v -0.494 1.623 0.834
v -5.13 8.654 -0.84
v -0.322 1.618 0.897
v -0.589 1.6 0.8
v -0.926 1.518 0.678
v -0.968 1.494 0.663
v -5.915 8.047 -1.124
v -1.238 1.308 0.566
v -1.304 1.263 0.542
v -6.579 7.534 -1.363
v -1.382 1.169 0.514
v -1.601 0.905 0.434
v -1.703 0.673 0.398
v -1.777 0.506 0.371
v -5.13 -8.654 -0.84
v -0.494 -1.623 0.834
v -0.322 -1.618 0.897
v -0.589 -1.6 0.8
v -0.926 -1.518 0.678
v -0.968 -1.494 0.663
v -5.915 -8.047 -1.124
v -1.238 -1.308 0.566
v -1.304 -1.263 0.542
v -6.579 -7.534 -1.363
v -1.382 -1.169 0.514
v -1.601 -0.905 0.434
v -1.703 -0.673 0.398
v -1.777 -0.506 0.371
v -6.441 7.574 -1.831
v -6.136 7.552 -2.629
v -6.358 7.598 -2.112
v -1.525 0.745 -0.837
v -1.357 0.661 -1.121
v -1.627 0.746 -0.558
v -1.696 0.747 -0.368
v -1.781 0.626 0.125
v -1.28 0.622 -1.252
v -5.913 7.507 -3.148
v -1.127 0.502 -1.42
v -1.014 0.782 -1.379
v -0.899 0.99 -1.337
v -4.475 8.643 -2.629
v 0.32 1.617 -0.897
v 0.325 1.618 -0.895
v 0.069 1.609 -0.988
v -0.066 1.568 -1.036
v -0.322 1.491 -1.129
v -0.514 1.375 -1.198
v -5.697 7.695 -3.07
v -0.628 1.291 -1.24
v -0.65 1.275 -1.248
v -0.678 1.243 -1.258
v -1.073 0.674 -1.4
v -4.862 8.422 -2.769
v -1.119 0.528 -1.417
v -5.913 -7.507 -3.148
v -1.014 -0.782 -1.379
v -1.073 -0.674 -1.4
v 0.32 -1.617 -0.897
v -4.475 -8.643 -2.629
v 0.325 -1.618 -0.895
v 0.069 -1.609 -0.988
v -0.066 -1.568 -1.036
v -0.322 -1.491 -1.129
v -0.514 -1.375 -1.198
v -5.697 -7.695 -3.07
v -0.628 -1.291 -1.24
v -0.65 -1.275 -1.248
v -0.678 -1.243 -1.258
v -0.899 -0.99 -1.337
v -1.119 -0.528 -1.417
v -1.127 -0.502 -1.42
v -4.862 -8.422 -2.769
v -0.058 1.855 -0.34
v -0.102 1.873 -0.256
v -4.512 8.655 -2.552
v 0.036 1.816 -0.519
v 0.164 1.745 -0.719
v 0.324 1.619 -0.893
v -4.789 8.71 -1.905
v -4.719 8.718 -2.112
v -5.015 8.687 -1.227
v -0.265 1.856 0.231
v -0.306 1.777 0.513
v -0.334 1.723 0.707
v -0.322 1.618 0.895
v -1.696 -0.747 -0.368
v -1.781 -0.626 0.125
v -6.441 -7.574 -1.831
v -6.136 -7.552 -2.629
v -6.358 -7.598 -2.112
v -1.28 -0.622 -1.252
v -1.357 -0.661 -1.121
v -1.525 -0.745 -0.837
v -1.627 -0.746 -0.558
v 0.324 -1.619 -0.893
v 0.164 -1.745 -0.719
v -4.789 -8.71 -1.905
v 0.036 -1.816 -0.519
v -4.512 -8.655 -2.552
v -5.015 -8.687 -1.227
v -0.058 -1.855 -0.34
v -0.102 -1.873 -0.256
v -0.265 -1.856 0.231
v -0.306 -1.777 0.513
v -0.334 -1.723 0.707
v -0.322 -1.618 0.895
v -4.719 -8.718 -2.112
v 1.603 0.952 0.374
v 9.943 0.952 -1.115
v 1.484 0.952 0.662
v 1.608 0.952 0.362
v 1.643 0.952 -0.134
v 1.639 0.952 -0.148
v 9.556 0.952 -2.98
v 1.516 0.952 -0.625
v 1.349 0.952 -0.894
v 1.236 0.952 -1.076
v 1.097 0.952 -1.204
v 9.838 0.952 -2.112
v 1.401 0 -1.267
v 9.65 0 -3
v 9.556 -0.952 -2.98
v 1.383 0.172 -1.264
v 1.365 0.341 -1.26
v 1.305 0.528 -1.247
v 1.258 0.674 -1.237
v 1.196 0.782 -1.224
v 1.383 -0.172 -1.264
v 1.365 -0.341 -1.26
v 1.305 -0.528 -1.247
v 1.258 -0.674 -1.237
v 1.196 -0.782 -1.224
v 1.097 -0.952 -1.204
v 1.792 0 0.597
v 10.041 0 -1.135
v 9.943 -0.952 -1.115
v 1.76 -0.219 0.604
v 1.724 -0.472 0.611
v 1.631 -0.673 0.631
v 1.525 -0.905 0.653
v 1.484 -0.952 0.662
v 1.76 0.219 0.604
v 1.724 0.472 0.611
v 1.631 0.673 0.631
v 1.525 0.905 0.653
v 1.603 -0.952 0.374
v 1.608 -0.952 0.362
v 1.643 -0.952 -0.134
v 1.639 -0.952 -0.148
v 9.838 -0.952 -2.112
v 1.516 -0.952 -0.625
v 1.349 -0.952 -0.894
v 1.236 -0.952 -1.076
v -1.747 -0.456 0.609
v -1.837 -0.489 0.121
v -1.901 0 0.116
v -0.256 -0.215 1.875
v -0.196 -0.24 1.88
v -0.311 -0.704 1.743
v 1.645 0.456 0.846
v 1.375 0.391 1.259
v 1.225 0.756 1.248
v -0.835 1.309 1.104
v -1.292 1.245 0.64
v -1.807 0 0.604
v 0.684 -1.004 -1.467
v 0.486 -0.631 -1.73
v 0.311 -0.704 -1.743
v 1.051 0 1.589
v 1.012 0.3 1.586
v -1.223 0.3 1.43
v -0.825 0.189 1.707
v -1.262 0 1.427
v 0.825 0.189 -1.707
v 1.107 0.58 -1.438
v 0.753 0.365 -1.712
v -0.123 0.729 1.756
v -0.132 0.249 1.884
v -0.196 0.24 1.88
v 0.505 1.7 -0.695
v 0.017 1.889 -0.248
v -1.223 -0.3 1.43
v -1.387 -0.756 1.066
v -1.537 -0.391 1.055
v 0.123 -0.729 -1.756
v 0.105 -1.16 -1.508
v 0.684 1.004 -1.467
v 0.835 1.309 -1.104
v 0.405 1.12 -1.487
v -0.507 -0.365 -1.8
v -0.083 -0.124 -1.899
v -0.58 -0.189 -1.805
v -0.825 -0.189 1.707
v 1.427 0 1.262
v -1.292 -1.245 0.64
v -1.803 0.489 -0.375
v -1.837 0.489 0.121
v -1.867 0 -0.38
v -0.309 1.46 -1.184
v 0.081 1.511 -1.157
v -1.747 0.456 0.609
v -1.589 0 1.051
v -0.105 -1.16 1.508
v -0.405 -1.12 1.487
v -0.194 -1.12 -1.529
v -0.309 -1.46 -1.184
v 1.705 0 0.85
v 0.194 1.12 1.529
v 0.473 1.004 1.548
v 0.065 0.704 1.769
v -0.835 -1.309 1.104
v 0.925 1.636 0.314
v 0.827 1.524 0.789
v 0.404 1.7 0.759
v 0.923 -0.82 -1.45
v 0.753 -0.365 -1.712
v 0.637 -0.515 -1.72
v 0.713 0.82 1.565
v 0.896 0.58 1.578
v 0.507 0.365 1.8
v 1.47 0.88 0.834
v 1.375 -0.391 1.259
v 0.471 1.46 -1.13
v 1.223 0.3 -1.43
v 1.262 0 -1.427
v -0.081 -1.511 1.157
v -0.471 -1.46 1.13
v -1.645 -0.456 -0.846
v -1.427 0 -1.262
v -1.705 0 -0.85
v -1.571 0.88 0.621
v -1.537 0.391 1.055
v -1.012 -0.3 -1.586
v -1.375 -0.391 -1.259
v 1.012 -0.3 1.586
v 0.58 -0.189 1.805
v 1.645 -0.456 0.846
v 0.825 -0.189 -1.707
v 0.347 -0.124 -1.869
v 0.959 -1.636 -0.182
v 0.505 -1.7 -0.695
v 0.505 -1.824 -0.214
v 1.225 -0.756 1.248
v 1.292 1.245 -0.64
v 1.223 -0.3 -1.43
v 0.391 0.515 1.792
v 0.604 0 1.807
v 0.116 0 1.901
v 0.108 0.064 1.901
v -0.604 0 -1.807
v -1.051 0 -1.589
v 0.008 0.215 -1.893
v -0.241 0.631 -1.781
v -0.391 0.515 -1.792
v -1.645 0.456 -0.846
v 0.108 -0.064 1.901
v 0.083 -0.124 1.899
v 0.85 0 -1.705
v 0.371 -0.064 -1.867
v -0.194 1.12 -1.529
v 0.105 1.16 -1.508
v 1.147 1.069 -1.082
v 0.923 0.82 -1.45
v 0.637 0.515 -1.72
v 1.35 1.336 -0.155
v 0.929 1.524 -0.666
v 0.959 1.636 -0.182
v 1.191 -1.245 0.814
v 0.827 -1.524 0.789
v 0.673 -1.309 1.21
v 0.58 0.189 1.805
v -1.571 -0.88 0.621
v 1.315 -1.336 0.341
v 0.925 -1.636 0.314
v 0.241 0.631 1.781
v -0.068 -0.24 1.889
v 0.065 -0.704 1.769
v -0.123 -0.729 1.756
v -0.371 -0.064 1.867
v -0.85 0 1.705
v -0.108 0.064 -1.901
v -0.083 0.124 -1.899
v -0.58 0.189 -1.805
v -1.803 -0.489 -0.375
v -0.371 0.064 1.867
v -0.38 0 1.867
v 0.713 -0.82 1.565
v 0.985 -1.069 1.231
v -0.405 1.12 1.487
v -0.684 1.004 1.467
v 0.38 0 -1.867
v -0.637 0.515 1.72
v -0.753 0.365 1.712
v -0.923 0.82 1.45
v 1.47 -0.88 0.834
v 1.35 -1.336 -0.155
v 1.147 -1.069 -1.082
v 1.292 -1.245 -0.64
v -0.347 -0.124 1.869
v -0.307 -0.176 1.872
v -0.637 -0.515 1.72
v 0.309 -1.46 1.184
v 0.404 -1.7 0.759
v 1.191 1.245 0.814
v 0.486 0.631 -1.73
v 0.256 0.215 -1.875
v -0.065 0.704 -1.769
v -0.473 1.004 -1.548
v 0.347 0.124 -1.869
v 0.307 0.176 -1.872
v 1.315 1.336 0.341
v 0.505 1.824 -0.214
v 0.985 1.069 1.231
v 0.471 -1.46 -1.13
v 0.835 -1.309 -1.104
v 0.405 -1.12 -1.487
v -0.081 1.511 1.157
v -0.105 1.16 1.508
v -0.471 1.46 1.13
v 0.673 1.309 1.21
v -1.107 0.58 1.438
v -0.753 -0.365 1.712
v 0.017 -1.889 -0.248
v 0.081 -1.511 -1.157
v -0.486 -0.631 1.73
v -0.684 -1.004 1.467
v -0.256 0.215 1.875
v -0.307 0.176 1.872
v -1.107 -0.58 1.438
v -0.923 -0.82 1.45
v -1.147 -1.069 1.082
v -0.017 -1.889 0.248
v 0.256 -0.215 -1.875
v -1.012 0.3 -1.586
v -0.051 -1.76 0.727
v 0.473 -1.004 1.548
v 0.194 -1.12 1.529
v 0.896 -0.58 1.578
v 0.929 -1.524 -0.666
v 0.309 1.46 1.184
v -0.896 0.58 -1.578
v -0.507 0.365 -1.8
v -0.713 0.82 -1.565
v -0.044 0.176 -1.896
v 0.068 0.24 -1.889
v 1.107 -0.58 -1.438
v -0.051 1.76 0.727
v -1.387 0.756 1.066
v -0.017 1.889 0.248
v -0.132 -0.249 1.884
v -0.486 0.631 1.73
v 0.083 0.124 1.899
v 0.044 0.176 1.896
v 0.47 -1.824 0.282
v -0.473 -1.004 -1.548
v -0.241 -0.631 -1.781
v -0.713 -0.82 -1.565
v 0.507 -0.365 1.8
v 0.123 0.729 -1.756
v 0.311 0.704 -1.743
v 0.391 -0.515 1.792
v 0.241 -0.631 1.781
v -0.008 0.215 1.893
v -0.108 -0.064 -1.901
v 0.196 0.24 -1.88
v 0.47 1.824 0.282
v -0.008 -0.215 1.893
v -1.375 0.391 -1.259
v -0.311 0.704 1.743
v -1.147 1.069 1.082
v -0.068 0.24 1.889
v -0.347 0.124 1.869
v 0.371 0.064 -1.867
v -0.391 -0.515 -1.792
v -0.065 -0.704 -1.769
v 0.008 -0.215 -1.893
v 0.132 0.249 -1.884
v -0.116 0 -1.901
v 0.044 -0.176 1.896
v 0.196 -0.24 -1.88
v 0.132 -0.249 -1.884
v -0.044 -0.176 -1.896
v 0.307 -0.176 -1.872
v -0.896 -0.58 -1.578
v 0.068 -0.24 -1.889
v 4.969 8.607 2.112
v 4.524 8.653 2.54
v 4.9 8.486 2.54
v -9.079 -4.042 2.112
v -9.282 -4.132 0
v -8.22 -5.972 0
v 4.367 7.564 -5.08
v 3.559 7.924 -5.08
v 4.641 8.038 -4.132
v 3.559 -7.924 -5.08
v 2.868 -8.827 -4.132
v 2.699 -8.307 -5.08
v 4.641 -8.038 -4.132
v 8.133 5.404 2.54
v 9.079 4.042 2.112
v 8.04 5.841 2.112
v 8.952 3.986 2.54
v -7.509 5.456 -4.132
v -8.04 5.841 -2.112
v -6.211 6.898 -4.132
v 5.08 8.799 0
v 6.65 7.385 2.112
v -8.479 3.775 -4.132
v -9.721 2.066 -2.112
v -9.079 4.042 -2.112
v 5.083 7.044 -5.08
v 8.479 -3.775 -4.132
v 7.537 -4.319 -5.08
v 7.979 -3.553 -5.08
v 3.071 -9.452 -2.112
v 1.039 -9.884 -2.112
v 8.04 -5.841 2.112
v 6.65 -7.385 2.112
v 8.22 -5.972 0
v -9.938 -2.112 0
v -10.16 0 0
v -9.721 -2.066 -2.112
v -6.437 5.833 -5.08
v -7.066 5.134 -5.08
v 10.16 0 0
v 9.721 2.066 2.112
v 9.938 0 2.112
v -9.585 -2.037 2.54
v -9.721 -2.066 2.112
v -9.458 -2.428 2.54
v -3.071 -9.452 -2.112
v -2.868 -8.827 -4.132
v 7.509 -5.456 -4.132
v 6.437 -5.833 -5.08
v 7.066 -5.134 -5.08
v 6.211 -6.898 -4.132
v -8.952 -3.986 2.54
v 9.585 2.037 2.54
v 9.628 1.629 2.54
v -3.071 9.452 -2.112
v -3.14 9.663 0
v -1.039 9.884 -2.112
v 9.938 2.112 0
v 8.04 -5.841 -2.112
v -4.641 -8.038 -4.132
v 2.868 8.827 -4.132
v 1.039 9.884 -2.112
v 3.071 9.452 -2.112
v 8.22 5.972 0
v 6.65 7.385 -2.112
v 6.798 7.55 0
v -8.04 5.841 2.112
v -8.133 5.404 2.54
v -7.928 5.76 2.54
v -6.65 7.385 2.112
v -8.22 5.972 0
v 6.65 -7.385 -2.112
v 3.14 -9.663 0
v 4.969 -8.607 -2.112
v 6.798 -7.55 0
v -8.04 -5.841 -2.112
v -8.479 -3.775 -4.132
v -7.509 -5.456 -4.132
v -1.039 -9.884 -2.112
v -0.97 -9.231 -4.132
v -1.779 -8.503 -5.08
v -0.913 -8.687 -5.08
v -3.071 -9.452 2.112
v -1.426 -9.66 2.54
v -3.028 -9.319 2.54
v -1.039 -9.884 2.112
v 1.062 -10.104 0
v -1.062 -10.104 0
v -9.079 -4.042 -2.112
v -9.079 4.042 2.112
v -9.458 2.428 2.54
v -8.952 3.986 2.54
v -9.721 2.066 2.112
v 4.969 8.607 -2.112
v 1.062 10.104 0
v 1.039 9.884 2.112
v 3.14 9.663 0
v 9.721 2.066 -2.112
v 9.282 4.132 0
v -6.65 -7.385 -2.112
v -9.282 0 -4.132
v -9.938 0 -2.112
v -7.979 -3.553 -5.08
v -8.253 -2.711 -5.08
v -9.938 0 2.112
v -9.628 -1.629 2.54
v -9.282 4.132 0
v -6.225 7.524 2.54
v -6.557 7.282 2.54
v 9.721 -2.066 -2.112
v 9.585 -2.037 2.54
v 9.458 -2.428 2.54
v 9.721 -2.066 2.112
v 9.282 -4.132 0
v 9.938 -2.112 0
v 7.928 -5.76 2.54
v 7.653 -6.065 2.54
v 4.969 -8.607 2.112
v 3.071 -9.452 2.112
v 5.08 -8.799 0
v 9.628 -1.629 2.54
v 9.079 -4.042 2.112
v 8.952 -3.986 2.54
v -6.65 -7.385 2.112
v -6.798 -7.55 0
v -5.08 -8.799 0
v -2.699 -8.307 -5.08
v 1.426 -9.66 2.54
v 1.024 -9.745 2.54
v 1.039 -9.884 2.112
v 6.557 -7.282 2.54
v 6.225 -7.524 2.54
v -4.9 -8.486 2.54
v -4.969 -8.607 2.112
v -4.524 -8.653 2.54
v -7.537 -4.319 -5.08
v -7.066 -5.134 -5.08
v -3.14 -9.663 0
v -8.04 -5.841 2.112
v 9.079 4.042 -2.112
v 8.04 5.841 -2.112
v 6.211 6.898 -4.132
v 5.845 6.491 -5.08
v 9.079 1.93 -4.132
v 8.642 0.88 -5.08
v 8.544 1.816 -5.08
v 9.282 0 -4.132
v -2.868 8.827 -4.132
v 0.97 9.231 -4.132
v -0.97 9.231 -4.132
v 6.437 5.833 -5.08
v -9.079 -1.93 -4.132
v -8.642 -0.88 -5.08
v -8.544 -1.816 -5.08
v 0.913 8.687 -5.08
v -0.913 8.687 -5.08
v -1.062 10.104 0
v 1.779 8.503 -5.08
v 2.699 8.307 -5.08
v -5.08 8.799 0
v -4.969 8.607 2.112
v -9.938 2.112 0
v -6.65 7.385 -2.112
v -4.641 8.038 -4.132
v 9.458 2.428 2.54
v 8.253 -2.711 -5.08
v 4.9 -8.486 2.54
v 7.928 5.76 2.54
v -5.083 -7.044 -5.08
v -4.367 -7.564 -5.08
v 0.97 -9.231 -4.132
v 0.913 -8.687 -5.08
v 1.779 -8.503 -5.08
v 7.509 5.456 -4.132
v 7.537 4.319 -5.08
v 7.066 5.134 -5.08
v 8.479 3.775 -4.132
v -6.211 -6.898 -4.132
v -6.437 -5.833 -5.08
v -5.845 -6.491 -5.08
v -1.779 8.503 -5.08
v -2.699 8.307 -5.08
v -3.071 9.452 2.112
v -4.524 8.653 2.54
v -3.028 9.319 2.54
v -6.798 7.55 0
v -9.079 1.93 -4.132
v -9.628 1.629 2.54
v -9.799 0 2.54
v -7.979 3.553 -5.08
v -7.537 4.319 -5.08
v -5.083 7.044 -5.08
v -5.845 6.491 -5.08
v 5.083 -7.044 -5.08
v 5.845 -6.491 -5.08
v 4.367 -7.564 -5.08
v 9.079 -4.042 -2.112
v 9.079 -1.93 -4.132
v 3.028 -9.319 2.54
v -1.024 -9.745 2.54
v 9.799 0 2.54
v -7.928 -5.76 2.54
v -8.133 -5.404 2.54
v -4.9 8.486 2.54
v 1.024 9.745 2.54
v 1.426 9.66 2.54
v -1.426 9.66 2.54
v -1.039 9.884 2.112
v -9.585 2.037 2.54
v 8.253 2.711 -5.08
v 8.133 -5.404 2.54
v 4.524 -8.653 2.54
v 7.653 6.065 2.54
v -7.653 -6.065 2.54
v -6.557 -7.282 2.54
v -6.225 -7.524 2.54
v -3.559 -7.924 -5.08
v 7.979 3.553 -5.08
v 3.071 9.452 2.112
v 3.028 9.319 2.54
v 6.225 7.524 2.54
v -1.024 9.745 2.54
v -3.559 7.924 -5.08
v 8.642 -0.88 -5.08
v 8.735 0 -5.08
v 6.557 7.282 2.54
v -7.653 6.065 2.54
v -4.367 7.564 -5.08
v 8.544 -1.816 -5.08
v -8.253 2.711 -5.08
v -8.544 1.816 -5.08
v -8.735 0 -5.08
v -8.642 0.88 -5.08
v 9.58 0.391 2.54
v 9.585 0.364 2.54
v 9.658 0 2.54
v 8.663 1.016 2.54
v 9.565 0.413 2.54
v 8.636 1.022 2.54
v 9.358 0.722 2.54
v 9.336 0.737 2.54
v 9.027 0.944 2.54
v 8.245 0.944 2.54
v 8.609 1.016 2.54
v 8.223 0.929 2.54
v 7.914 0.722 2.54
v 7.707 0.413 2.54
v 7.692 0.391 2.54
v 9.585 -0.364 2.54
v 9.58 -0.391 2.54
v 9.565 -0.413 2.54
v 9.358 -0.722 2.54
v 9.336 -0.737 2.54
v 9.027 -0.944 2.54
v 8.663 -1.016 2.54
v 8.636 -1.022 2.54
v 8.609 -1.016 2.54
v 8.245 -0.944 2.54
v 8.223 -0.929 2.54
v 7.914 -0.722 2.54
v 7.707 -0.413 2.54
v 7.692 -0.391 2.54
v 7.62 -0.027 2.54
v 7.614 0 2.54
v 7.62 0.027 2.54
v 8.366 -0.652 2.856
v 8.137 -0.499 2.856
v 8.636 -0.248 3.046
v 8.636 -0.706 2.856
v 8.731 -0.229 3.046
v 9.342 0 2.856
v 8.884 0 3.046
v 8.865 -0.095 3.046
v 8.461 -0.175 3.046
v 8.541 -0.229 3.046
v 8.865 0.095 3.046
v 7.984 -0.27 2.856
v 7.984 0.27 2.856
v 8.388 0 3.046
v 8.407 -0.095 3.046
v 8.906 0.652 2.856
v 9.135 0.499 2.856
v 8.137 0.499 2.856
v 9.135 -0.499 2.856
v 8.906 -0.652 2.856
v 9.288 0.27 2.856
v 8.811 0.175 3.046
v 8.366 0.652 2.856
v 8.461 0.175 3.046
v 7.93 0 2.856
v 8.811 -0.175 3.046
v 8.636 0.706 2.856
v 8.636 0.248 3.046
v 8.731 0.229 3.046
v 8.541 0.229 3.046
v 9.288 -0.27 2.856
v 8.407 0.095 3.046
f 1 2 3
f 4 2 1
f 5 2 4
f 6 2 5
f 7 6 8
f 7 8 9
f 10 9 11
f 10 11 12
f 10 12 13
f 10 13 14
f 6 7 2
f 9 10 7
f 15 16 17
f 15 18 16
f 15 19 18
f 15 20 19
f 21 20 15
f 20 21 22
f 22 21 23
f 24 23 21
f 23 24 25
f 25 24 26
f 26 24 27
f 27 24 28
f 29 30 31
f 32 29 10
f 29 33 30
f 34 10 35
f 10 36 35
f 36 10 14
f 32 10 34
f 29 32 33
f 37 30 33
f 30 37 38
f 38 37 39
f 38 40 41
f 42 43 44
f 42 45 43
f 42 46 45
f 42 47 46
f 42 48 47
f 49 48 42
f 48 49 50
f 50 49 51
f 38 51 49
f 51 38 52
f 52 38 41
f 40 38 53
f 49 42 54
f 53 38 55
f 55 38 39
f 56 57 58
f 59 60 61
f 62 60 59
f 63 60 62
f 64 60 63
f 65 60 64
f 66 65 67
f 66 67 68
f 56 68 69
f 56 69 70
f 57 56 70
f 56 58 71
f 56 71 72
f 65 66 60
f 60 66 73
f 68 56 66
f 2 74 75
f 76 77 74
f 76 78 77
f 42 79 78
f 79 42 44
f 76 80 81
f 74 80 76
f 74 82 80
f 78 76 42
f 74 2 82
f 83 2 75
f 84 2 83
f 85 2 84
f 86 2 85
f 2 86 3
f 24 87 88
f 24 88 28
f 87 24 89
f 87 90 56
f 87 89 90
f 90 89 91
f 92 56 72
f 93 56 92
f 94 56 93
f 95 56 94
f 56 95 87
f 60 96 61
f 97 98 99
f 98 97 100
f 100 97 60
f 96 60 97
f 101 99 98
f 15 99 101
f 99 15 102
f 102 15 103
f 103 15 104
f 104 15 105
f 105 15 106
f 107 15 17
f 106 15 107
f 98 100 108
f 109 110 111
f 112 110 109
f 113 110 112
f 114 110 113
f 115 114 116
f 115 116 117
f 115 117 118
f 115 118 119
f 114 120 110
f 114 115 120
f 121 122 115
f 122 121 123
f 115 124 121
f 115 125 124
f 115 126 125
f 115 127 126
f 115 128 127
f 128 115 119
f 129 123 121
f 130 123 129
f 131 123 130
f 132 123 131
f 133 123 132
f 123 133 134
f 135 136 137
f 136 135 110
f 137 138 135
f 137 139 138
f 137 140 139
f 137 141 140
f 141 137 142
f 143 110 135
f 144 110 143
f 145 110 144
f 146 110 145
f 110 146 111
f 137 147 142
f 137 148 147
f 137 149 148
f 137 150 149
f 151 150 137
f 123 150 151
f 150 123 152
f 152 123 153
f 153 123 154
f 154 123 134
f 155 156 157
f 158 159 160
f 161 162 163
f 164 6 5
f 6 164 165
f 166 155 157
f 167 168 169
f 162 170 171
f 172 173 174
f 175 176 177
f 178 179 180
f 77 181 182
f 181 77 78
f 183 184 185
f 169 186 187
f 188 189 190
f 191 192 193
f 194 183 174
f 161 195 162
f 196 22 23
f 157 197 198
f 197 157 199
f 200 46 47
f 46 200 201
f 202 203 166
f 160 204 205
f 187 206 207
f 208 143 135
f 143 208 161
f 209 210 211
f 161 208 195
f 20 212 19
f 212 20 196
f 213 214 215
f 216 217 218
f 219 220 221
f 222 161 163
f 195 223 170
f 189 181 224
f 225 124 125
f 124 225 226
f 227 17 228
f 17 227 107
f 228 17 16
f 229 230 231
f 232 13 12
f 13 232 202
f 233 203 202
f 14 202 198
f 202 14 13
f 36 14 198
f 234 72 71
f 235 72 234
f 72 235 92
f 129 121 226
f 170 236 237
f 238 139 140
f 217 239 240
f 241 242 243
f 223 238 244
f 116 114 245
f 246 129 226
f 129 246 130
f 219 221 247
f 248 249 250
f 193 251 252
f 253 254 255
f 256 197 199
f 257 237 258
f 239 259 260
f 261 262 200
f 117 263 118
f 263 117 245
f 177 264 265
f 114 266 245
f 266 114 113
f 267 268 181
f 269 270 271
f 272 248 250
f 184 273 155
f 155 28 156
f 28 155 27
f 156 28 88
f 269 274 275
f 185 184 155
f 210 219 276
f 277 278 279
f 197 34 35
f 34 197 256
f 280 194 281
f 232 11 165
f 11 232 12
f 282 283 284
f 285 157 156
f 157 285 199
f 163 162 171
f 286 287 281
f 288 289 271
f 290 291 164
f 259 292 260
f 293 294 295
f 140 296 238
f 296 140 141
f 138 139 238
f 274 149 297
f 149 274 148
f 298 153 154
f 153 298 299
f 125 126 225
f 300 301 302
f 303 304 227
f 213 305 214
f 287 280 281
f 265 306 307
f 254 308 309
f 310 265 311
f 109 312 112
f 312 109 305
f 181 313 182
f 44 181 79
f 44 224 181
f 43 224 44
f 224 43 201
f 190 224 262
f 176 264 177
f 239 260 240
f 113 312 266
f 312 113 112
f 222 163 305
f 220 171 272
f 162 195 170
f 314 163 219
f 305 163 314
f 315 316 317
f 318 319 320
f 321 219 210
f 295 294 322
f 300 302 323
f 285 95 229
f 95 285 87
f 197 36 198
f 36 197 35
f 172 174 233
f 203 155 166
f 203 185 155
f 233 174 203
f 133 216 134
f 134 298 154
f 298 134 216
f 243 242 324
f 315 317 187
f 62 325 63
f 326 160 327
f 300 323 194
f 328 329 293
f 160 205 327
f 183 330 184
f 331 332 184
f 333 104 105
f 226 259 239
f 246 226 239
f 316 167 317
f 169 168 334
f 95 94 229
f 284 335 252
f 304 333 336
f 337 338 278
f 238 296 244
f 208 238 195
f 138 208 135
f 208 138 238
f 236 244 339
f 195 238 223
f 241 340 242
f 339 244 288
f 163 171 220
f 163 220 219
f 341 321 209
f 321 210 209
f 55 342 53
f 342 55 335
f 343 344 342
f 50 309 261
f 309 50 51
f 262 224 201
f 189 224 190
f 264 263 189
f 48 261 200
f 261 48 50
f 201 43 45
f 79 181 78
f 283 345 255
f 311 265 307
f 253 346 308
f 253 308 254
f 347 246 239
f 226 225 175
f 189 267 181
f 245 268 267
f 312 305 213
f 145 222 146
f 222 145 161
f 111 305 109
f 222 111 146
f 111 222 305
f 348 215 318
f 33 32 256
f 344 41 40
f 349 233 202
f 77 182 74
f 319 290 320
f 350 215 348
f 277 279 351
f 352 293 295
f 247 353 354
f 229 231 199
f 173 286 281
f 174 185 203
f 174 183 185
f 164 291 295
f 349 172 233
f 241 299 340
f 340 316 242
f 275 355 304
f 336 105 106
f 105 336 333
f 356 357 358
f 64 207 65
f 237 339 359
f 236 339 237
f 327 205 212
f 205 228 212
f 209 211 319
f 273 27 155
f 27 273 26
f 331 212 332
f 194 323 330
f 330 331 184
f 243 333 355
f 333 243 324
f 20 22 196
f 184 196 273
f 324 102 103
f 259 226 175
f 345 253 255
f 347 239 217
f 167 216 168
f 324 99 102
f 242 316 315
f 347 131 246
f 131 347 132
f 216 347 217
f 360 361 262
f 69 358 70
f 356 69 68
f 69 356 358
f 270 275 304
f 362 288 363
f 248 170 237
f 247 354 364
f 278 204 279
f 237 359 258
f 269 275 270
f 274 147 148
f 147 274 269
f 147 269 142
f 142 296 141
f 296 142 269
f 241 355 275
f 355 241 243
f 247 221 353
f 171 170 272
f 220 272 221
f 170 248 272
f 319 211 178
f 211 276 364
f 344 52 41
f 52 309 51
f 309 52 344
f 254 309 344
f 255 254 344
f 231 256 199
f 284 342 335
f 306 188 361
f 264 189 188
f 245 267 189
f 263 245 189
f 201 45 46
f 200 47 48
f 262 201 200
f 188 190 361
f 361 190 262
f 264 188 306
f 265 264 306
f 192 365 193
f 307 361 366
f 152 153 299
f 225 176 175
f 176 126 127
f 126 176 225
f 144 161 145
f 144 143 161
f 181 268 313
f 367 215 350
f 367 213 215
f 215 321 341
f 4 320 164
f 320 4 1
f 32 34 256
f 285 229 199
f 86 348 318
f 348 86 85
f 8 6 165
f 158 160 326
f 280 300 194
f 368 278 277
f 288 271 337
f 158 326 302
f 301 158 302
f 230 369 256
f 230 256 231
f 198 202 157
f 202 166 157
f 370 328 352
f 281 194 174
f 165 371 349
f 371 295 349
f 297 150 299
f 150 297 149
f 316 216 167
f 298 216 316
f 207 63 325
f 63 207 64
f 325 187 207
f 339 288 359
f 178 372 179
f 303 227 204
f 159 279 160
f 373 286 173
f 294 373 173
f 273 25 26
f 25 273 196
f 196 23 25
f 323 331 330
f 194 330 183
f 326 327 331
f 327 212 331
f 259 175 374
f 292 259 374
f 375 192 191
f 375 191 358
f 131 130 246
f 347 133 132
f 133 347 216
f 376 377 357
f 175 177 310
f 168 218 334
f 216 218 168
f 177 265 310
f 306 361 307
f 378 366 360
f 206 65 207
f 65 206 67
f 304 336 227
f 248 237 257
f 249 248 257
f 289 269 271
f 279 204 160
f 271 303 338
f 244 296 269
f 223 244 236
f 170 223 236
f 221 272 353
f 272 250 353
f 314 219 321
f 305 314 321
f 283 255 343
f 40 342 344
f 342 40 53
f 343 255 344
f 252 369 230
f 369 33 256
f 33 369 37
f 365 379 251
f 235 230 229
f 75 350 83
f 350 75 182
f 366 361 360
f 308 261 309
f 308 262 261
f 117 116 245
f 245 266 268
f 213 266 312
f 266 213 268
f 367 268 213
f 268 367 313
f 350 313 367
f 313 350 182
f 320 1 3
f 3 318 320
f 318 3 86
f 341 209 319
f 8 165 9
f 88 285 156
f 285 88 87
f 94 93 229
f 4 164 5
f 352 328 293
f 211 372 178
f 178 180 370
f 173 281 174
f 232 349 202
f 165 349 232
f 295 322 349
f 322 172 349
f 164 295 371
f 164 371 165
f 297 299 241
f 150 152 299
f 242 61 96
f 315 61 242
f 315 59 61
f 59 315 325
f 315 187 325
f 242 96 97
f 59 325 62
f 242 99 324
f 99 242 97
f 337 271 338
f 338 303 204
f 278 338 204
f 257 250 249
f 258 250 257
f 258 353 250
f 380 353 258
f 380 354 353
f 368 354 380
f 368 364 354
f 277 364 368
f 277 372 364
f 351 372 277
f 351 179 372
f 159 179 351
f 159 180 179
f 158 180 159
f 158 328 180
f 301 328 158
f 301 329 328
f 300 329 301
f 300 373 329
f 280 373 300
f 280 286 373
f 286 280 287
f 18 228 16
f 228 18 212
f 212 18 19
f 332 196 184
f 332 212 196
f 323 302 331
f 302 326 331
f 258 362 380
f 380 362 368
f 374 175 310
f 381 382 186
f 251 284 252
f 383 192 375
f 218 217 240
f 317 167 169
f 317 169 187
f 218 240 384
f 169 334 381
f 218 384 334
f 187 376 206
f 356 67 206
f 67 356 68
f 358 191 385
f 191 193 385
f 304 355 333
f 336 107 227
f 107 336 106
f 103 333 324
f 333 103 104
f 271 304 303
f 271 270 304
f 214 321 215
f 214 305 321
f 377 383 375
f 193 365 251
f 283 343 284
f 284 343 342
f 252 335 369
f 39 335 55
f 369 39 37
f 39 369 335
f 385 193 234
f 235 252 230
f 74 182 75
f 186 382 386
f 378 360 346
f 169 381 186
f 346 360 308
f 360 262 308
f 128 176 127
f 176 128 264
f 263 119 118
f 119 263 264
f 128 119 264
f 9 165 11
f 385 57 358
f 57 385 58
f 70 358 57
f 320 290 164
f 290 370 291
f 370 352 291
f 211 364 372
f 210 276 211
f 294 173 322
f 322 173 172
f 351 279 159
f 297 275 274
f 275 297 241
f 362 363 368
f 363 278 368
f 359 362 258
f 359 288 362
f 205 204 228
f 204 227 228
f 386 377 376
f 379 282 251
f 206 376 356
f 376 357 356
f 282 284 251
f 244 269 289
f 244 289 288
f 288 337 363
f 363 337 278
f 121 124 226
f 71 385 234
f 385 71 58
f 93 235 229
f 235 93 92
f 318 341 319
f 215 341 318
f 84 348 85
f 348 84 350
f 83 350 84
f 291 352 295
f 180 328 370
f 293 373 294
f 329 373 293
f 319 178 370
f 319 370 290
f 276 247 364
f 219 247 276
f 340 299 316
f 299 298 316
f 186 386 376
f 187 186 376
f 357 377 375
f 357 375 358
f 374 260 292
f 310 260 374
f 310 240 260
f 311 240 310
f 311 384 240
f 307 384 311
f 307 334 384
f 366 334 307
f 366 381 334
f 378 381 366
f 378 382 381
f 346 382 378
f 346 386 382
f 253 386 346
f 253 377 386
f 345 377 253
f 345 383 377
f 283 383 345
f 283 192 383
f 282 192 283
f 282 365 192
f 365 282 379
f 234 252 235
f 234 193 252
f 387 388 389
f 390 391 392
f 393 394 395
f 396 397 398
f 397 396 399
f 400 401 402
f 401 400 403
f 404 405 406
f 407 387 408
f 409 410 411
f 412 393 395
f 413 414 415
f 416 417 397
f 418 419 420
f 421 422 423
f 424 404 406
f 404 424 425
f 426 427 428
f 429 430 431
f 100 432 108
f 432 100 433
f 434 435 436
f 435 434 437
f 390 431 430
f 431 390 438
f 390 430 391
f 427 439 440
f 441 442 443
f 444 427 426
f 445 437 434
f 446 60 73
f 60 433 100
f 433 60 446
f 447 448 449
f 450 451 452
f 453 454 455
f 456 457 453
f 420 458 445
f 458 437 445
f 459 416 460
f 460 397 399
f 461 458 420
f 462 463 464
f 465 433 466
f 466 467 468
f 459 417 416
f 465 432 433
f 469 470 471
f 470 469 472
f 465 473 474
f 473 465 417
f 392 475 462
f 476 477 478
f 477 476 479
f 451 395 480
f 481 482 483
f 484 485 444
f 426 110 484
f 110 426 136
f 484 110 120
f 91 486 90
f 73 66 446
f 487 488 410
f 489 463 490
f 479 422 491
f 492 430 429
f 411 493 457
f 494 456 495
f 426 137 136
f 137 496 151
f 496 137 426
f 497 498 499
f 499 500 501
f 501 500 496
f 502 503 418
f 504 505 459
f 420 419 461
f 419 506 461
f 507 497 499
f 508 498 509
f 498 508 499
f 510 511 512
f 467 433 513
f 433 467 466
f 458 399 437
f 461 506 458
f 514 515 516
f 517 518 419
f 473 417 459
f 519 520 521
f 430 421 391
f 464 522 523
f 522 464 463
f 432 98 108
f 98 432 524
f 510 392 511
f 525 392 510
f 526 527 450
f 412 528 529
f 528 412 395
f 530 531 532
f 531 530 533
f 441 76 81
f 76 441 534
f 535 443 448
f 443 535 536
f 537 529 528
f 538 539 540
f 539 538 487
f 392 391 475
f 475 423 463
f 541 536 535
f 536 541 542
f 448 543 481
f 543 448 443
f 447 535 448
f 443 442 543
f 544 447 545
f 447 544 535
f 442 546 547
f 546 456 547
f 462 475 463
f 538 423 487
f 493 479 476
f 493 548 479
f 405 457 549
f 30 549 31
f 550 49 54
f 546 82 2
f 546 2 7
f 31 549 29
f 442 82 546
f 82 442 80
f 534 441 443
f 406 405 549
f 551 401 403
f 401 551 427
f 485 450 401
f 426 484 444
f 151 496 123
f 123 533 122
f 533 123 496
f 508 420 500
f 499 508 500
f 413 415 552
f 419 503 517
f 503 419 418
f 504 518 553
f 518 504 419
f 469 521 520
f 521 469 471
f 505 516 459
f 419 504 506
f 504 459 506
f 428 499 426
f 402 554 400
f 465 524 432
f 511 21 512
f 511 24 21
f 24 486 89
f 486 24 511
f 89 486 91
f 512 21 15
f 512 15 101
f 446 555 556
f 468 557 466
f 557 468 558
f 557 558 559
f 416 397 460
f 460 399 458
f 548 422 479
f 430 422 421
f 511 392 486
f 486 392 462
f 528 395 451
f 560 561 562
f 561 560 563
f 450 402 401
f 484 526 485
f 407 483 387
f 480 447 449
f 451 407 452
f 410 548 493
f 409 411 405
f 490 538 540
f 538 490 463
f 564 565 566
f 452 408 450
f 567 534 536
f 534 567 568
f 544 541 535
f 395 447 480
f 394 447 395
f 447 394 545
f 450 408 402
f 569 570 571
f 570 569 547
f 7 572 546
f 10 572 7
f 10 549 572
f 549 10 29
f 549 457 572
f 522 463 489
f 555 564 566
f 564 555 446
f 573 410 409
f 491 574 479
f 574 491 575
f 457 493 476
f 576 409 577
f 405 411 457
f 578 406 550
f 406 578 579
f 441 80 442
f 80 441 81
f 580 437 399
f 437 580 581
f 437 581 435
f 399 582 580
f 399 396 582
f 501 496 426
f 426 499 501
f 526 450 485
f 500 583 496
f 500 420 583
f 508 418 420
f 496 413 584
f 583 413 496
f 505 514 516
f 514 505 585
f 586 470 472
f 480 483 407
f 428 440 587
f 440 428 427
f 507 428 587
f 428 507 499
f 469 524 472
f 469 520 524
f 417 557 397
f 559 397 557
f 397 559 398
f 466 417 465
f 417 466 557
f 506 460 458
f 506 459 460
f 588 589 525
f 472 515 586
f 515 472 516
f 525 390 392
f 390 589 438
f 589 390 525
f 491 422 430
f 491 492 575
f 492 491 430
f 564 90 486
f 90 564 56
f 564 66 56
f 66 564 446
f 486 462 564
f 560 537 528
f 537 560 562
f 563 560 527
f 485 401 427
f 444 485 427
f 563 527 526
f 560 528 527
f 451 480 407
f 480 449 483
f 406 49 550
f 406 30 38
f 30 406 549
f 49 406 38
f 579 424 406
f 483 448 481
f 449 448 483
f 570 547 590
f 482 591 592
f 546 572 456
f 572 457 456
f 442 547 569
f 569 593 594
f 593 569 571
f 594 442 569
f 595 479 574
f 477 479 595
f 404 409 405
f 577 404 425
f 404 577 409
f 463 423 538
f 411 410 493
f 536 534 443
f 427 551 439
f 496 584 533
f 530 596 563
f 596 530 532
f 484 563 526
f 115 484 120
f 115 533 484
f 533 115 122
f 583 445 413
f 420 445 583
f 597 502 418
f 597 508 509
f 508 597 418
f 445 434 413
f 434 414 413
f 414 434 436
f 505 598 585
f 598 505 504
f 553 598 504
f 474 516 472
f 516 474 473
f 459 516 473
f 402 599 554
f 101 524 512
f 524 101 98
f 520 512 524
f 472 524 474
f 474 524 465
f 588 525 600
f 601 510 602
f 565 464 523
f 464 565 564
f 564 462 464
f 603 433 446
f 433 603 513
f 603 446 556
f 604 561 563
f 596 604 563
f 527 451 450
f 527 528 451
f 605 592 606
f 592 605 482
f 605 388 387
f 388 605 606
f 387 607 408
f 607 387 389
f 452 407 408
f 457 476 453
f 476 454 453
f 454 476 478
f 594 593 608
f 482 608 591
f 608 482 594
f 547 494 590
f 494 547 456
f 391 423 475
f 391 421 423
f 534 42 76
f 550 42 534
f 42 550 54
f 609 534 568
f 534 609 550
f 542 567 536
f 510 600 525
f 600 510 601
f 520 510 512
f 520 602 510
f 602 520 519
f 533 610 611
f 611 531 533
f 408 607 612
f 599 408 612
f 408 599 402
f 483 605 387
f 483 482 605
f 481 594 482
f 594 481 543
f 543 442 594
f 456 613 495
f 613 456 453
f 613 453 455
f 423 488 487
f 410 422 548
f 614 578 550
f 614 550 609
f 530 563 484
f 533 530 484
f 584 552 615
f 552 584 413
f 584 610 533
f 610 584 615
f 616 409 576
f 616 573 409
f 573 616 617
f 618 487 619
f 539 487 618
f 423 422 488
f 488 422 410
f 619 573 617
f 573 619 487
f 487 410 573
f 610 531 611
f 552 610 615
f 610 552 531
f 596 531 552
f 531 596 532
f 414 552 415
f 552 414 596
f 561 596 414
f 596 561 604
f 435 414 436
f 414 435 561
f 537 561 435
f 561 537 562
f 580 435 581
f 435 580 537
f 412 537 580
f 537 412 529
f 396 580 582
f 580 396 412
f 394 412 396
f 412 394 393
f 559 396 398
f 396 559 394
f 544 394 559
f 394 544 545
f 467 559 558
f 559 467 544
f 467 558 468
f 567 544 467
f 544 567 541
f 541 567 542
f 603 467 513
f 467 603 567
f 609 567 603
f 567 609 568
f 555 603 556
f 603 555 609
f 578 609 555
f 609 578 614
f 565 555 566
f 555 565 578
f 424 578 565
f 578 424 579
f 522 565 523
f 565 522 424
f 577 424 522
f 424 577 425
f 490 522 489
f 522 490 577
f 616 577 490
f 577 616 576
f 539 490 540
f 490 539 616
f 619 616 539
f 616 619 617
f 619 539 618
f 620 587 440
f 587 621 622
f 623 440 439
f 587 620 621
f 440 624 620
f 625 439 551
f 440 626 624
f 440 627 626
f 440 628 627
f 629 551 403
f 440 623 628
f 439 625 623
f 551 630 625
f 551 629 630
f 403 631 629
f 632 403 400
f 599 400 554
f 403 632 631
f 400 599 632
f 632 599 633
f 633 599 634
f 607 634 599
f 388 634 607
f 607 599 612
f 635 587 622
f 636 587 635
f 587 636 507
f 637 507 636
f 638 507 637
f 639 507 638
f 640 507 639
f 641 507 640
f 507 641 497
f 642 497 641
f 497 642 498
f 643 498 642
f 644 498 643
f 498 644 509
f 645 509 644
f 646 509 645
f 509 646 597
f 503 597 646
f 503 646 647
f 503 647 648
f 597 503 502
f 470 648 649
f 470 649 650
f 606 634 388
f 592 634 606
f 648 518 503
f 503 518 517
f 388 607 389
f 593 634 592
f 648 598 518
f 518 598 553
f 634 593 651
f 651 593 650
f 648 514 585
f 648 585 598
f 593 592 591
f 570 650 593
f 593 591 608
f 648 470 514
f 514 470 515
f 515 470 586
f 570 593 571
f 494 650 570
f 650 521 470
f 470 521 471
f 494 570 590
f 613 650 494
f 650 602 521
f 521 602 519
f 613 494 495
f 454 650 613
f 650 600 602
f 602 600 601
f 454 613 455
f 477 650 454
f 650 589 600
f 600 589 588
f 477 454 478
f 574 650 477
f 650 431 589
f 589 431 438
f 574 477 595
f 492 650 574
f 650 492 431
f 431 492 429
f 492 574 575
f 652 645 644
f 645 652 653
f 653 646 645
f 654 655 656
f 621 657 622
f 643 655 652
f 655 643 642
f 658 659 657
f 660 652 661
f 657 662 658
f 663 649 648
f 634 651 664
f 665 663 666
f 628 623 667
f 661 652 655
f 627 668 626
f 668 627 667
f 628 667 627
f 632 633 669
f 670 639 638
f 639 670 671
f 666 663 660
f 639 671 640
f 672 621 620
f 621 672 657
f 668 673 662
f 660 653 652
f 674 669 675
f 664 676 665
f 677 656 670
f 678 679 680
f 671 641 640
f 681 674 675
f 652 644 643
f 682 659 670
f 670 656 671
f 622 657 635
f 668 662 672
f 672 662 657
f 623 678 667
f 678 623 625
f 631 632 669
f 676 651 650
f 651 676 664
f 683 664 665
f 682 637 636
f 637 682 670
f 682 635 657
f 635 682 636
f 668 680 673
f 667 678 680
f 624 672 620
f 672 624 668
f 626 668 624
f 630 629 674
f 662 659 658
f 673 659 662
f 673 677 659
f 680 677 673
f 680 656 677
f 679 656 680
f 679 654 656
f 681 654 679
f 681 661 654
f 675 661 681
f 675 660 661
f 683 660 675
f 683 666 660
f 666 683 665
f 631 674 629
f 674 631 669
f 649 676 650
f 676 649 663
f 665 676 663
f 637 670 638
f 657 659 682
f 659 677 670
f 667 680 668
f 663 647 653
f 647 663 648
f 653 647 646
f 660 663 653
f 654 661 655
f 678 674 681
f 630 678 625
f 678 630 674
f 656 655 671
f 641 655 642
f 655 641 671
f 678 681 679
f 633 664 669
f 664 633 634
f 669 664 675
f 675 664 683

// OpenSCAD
// I like to work in inches somethimes so I create
// a variable called 'in' so I can say 1*in instead of 25.4
in=25.4;  
$fs=.5;

// This module makes a solid that is subtracted from the node
// object later I subtract it from truncated sphere but you could replace the
// sphere with anything  For example you could make a buckyball with teddy bear
// nodes.  Or you could make each node a different object.
module bucky_holes()
{
// dia is the diameter of the hole (or size of square hole) that will be created
dia=.075*in; 

// len is the length of the part that will be subtracted really big so
// you prabably wont need to adjust it (unless you are making something huge!)
len= 3*in;
    
// phi is the angle between a hexagon facet edge and 
// the pentagon facet plane in a truncated icosahedron 
phi=31.7175; 

rotate ([0,-phi/2,0])
{
rotate ([0,90,180-54]) hole_shape(len,dia);
rotate ([0,90,-(180-54)]) hole_shape(len,dia);
}

rotate ([0,phi/2,0])
{
rotate ([0,90,0]) hole_shape(len,dia);
}
sphere (dia);
}

// The hole shape module defines the shape of the
// holes created in the node object. square holes
// seemed to work well for the toothpick buckyball
module hole_shape(len,dia)
{
    translate([0,0,len/2])cube([dia,dia,len],center=true);
    //cylinder (len,dia/2,$fn=20); // use this line to make round holes
}

rnode=.40*in;  // Define the radius of the node
dnode=rnode*2; // Set the resulting diameter of the nodes

difference ()
{
    sphere (rnode); //This is the node object (could be a teddybear)
    
    // Rotate the holes to lin them up with the xy plane
    // I just eyeballed where they looked good -4 degrees looks right
    rotate ([0,-4,0]) 
    {
        bucky_holes();
    }
    //trim the top and bottom of the sphere
    //(comment the next two lines to make full sphere nodes.)
    translate ([0,0,-6/8*dnode]) cube([dnode,dnode,dnode],true);
    translate ([0,0,5/8*dnode]) cube([dnode,dnode,dnode],true);
}
//Make the dot indicating which hole is for the hexogon sides.
translate([.34*in,0,1.8])sphere(.05*in);

